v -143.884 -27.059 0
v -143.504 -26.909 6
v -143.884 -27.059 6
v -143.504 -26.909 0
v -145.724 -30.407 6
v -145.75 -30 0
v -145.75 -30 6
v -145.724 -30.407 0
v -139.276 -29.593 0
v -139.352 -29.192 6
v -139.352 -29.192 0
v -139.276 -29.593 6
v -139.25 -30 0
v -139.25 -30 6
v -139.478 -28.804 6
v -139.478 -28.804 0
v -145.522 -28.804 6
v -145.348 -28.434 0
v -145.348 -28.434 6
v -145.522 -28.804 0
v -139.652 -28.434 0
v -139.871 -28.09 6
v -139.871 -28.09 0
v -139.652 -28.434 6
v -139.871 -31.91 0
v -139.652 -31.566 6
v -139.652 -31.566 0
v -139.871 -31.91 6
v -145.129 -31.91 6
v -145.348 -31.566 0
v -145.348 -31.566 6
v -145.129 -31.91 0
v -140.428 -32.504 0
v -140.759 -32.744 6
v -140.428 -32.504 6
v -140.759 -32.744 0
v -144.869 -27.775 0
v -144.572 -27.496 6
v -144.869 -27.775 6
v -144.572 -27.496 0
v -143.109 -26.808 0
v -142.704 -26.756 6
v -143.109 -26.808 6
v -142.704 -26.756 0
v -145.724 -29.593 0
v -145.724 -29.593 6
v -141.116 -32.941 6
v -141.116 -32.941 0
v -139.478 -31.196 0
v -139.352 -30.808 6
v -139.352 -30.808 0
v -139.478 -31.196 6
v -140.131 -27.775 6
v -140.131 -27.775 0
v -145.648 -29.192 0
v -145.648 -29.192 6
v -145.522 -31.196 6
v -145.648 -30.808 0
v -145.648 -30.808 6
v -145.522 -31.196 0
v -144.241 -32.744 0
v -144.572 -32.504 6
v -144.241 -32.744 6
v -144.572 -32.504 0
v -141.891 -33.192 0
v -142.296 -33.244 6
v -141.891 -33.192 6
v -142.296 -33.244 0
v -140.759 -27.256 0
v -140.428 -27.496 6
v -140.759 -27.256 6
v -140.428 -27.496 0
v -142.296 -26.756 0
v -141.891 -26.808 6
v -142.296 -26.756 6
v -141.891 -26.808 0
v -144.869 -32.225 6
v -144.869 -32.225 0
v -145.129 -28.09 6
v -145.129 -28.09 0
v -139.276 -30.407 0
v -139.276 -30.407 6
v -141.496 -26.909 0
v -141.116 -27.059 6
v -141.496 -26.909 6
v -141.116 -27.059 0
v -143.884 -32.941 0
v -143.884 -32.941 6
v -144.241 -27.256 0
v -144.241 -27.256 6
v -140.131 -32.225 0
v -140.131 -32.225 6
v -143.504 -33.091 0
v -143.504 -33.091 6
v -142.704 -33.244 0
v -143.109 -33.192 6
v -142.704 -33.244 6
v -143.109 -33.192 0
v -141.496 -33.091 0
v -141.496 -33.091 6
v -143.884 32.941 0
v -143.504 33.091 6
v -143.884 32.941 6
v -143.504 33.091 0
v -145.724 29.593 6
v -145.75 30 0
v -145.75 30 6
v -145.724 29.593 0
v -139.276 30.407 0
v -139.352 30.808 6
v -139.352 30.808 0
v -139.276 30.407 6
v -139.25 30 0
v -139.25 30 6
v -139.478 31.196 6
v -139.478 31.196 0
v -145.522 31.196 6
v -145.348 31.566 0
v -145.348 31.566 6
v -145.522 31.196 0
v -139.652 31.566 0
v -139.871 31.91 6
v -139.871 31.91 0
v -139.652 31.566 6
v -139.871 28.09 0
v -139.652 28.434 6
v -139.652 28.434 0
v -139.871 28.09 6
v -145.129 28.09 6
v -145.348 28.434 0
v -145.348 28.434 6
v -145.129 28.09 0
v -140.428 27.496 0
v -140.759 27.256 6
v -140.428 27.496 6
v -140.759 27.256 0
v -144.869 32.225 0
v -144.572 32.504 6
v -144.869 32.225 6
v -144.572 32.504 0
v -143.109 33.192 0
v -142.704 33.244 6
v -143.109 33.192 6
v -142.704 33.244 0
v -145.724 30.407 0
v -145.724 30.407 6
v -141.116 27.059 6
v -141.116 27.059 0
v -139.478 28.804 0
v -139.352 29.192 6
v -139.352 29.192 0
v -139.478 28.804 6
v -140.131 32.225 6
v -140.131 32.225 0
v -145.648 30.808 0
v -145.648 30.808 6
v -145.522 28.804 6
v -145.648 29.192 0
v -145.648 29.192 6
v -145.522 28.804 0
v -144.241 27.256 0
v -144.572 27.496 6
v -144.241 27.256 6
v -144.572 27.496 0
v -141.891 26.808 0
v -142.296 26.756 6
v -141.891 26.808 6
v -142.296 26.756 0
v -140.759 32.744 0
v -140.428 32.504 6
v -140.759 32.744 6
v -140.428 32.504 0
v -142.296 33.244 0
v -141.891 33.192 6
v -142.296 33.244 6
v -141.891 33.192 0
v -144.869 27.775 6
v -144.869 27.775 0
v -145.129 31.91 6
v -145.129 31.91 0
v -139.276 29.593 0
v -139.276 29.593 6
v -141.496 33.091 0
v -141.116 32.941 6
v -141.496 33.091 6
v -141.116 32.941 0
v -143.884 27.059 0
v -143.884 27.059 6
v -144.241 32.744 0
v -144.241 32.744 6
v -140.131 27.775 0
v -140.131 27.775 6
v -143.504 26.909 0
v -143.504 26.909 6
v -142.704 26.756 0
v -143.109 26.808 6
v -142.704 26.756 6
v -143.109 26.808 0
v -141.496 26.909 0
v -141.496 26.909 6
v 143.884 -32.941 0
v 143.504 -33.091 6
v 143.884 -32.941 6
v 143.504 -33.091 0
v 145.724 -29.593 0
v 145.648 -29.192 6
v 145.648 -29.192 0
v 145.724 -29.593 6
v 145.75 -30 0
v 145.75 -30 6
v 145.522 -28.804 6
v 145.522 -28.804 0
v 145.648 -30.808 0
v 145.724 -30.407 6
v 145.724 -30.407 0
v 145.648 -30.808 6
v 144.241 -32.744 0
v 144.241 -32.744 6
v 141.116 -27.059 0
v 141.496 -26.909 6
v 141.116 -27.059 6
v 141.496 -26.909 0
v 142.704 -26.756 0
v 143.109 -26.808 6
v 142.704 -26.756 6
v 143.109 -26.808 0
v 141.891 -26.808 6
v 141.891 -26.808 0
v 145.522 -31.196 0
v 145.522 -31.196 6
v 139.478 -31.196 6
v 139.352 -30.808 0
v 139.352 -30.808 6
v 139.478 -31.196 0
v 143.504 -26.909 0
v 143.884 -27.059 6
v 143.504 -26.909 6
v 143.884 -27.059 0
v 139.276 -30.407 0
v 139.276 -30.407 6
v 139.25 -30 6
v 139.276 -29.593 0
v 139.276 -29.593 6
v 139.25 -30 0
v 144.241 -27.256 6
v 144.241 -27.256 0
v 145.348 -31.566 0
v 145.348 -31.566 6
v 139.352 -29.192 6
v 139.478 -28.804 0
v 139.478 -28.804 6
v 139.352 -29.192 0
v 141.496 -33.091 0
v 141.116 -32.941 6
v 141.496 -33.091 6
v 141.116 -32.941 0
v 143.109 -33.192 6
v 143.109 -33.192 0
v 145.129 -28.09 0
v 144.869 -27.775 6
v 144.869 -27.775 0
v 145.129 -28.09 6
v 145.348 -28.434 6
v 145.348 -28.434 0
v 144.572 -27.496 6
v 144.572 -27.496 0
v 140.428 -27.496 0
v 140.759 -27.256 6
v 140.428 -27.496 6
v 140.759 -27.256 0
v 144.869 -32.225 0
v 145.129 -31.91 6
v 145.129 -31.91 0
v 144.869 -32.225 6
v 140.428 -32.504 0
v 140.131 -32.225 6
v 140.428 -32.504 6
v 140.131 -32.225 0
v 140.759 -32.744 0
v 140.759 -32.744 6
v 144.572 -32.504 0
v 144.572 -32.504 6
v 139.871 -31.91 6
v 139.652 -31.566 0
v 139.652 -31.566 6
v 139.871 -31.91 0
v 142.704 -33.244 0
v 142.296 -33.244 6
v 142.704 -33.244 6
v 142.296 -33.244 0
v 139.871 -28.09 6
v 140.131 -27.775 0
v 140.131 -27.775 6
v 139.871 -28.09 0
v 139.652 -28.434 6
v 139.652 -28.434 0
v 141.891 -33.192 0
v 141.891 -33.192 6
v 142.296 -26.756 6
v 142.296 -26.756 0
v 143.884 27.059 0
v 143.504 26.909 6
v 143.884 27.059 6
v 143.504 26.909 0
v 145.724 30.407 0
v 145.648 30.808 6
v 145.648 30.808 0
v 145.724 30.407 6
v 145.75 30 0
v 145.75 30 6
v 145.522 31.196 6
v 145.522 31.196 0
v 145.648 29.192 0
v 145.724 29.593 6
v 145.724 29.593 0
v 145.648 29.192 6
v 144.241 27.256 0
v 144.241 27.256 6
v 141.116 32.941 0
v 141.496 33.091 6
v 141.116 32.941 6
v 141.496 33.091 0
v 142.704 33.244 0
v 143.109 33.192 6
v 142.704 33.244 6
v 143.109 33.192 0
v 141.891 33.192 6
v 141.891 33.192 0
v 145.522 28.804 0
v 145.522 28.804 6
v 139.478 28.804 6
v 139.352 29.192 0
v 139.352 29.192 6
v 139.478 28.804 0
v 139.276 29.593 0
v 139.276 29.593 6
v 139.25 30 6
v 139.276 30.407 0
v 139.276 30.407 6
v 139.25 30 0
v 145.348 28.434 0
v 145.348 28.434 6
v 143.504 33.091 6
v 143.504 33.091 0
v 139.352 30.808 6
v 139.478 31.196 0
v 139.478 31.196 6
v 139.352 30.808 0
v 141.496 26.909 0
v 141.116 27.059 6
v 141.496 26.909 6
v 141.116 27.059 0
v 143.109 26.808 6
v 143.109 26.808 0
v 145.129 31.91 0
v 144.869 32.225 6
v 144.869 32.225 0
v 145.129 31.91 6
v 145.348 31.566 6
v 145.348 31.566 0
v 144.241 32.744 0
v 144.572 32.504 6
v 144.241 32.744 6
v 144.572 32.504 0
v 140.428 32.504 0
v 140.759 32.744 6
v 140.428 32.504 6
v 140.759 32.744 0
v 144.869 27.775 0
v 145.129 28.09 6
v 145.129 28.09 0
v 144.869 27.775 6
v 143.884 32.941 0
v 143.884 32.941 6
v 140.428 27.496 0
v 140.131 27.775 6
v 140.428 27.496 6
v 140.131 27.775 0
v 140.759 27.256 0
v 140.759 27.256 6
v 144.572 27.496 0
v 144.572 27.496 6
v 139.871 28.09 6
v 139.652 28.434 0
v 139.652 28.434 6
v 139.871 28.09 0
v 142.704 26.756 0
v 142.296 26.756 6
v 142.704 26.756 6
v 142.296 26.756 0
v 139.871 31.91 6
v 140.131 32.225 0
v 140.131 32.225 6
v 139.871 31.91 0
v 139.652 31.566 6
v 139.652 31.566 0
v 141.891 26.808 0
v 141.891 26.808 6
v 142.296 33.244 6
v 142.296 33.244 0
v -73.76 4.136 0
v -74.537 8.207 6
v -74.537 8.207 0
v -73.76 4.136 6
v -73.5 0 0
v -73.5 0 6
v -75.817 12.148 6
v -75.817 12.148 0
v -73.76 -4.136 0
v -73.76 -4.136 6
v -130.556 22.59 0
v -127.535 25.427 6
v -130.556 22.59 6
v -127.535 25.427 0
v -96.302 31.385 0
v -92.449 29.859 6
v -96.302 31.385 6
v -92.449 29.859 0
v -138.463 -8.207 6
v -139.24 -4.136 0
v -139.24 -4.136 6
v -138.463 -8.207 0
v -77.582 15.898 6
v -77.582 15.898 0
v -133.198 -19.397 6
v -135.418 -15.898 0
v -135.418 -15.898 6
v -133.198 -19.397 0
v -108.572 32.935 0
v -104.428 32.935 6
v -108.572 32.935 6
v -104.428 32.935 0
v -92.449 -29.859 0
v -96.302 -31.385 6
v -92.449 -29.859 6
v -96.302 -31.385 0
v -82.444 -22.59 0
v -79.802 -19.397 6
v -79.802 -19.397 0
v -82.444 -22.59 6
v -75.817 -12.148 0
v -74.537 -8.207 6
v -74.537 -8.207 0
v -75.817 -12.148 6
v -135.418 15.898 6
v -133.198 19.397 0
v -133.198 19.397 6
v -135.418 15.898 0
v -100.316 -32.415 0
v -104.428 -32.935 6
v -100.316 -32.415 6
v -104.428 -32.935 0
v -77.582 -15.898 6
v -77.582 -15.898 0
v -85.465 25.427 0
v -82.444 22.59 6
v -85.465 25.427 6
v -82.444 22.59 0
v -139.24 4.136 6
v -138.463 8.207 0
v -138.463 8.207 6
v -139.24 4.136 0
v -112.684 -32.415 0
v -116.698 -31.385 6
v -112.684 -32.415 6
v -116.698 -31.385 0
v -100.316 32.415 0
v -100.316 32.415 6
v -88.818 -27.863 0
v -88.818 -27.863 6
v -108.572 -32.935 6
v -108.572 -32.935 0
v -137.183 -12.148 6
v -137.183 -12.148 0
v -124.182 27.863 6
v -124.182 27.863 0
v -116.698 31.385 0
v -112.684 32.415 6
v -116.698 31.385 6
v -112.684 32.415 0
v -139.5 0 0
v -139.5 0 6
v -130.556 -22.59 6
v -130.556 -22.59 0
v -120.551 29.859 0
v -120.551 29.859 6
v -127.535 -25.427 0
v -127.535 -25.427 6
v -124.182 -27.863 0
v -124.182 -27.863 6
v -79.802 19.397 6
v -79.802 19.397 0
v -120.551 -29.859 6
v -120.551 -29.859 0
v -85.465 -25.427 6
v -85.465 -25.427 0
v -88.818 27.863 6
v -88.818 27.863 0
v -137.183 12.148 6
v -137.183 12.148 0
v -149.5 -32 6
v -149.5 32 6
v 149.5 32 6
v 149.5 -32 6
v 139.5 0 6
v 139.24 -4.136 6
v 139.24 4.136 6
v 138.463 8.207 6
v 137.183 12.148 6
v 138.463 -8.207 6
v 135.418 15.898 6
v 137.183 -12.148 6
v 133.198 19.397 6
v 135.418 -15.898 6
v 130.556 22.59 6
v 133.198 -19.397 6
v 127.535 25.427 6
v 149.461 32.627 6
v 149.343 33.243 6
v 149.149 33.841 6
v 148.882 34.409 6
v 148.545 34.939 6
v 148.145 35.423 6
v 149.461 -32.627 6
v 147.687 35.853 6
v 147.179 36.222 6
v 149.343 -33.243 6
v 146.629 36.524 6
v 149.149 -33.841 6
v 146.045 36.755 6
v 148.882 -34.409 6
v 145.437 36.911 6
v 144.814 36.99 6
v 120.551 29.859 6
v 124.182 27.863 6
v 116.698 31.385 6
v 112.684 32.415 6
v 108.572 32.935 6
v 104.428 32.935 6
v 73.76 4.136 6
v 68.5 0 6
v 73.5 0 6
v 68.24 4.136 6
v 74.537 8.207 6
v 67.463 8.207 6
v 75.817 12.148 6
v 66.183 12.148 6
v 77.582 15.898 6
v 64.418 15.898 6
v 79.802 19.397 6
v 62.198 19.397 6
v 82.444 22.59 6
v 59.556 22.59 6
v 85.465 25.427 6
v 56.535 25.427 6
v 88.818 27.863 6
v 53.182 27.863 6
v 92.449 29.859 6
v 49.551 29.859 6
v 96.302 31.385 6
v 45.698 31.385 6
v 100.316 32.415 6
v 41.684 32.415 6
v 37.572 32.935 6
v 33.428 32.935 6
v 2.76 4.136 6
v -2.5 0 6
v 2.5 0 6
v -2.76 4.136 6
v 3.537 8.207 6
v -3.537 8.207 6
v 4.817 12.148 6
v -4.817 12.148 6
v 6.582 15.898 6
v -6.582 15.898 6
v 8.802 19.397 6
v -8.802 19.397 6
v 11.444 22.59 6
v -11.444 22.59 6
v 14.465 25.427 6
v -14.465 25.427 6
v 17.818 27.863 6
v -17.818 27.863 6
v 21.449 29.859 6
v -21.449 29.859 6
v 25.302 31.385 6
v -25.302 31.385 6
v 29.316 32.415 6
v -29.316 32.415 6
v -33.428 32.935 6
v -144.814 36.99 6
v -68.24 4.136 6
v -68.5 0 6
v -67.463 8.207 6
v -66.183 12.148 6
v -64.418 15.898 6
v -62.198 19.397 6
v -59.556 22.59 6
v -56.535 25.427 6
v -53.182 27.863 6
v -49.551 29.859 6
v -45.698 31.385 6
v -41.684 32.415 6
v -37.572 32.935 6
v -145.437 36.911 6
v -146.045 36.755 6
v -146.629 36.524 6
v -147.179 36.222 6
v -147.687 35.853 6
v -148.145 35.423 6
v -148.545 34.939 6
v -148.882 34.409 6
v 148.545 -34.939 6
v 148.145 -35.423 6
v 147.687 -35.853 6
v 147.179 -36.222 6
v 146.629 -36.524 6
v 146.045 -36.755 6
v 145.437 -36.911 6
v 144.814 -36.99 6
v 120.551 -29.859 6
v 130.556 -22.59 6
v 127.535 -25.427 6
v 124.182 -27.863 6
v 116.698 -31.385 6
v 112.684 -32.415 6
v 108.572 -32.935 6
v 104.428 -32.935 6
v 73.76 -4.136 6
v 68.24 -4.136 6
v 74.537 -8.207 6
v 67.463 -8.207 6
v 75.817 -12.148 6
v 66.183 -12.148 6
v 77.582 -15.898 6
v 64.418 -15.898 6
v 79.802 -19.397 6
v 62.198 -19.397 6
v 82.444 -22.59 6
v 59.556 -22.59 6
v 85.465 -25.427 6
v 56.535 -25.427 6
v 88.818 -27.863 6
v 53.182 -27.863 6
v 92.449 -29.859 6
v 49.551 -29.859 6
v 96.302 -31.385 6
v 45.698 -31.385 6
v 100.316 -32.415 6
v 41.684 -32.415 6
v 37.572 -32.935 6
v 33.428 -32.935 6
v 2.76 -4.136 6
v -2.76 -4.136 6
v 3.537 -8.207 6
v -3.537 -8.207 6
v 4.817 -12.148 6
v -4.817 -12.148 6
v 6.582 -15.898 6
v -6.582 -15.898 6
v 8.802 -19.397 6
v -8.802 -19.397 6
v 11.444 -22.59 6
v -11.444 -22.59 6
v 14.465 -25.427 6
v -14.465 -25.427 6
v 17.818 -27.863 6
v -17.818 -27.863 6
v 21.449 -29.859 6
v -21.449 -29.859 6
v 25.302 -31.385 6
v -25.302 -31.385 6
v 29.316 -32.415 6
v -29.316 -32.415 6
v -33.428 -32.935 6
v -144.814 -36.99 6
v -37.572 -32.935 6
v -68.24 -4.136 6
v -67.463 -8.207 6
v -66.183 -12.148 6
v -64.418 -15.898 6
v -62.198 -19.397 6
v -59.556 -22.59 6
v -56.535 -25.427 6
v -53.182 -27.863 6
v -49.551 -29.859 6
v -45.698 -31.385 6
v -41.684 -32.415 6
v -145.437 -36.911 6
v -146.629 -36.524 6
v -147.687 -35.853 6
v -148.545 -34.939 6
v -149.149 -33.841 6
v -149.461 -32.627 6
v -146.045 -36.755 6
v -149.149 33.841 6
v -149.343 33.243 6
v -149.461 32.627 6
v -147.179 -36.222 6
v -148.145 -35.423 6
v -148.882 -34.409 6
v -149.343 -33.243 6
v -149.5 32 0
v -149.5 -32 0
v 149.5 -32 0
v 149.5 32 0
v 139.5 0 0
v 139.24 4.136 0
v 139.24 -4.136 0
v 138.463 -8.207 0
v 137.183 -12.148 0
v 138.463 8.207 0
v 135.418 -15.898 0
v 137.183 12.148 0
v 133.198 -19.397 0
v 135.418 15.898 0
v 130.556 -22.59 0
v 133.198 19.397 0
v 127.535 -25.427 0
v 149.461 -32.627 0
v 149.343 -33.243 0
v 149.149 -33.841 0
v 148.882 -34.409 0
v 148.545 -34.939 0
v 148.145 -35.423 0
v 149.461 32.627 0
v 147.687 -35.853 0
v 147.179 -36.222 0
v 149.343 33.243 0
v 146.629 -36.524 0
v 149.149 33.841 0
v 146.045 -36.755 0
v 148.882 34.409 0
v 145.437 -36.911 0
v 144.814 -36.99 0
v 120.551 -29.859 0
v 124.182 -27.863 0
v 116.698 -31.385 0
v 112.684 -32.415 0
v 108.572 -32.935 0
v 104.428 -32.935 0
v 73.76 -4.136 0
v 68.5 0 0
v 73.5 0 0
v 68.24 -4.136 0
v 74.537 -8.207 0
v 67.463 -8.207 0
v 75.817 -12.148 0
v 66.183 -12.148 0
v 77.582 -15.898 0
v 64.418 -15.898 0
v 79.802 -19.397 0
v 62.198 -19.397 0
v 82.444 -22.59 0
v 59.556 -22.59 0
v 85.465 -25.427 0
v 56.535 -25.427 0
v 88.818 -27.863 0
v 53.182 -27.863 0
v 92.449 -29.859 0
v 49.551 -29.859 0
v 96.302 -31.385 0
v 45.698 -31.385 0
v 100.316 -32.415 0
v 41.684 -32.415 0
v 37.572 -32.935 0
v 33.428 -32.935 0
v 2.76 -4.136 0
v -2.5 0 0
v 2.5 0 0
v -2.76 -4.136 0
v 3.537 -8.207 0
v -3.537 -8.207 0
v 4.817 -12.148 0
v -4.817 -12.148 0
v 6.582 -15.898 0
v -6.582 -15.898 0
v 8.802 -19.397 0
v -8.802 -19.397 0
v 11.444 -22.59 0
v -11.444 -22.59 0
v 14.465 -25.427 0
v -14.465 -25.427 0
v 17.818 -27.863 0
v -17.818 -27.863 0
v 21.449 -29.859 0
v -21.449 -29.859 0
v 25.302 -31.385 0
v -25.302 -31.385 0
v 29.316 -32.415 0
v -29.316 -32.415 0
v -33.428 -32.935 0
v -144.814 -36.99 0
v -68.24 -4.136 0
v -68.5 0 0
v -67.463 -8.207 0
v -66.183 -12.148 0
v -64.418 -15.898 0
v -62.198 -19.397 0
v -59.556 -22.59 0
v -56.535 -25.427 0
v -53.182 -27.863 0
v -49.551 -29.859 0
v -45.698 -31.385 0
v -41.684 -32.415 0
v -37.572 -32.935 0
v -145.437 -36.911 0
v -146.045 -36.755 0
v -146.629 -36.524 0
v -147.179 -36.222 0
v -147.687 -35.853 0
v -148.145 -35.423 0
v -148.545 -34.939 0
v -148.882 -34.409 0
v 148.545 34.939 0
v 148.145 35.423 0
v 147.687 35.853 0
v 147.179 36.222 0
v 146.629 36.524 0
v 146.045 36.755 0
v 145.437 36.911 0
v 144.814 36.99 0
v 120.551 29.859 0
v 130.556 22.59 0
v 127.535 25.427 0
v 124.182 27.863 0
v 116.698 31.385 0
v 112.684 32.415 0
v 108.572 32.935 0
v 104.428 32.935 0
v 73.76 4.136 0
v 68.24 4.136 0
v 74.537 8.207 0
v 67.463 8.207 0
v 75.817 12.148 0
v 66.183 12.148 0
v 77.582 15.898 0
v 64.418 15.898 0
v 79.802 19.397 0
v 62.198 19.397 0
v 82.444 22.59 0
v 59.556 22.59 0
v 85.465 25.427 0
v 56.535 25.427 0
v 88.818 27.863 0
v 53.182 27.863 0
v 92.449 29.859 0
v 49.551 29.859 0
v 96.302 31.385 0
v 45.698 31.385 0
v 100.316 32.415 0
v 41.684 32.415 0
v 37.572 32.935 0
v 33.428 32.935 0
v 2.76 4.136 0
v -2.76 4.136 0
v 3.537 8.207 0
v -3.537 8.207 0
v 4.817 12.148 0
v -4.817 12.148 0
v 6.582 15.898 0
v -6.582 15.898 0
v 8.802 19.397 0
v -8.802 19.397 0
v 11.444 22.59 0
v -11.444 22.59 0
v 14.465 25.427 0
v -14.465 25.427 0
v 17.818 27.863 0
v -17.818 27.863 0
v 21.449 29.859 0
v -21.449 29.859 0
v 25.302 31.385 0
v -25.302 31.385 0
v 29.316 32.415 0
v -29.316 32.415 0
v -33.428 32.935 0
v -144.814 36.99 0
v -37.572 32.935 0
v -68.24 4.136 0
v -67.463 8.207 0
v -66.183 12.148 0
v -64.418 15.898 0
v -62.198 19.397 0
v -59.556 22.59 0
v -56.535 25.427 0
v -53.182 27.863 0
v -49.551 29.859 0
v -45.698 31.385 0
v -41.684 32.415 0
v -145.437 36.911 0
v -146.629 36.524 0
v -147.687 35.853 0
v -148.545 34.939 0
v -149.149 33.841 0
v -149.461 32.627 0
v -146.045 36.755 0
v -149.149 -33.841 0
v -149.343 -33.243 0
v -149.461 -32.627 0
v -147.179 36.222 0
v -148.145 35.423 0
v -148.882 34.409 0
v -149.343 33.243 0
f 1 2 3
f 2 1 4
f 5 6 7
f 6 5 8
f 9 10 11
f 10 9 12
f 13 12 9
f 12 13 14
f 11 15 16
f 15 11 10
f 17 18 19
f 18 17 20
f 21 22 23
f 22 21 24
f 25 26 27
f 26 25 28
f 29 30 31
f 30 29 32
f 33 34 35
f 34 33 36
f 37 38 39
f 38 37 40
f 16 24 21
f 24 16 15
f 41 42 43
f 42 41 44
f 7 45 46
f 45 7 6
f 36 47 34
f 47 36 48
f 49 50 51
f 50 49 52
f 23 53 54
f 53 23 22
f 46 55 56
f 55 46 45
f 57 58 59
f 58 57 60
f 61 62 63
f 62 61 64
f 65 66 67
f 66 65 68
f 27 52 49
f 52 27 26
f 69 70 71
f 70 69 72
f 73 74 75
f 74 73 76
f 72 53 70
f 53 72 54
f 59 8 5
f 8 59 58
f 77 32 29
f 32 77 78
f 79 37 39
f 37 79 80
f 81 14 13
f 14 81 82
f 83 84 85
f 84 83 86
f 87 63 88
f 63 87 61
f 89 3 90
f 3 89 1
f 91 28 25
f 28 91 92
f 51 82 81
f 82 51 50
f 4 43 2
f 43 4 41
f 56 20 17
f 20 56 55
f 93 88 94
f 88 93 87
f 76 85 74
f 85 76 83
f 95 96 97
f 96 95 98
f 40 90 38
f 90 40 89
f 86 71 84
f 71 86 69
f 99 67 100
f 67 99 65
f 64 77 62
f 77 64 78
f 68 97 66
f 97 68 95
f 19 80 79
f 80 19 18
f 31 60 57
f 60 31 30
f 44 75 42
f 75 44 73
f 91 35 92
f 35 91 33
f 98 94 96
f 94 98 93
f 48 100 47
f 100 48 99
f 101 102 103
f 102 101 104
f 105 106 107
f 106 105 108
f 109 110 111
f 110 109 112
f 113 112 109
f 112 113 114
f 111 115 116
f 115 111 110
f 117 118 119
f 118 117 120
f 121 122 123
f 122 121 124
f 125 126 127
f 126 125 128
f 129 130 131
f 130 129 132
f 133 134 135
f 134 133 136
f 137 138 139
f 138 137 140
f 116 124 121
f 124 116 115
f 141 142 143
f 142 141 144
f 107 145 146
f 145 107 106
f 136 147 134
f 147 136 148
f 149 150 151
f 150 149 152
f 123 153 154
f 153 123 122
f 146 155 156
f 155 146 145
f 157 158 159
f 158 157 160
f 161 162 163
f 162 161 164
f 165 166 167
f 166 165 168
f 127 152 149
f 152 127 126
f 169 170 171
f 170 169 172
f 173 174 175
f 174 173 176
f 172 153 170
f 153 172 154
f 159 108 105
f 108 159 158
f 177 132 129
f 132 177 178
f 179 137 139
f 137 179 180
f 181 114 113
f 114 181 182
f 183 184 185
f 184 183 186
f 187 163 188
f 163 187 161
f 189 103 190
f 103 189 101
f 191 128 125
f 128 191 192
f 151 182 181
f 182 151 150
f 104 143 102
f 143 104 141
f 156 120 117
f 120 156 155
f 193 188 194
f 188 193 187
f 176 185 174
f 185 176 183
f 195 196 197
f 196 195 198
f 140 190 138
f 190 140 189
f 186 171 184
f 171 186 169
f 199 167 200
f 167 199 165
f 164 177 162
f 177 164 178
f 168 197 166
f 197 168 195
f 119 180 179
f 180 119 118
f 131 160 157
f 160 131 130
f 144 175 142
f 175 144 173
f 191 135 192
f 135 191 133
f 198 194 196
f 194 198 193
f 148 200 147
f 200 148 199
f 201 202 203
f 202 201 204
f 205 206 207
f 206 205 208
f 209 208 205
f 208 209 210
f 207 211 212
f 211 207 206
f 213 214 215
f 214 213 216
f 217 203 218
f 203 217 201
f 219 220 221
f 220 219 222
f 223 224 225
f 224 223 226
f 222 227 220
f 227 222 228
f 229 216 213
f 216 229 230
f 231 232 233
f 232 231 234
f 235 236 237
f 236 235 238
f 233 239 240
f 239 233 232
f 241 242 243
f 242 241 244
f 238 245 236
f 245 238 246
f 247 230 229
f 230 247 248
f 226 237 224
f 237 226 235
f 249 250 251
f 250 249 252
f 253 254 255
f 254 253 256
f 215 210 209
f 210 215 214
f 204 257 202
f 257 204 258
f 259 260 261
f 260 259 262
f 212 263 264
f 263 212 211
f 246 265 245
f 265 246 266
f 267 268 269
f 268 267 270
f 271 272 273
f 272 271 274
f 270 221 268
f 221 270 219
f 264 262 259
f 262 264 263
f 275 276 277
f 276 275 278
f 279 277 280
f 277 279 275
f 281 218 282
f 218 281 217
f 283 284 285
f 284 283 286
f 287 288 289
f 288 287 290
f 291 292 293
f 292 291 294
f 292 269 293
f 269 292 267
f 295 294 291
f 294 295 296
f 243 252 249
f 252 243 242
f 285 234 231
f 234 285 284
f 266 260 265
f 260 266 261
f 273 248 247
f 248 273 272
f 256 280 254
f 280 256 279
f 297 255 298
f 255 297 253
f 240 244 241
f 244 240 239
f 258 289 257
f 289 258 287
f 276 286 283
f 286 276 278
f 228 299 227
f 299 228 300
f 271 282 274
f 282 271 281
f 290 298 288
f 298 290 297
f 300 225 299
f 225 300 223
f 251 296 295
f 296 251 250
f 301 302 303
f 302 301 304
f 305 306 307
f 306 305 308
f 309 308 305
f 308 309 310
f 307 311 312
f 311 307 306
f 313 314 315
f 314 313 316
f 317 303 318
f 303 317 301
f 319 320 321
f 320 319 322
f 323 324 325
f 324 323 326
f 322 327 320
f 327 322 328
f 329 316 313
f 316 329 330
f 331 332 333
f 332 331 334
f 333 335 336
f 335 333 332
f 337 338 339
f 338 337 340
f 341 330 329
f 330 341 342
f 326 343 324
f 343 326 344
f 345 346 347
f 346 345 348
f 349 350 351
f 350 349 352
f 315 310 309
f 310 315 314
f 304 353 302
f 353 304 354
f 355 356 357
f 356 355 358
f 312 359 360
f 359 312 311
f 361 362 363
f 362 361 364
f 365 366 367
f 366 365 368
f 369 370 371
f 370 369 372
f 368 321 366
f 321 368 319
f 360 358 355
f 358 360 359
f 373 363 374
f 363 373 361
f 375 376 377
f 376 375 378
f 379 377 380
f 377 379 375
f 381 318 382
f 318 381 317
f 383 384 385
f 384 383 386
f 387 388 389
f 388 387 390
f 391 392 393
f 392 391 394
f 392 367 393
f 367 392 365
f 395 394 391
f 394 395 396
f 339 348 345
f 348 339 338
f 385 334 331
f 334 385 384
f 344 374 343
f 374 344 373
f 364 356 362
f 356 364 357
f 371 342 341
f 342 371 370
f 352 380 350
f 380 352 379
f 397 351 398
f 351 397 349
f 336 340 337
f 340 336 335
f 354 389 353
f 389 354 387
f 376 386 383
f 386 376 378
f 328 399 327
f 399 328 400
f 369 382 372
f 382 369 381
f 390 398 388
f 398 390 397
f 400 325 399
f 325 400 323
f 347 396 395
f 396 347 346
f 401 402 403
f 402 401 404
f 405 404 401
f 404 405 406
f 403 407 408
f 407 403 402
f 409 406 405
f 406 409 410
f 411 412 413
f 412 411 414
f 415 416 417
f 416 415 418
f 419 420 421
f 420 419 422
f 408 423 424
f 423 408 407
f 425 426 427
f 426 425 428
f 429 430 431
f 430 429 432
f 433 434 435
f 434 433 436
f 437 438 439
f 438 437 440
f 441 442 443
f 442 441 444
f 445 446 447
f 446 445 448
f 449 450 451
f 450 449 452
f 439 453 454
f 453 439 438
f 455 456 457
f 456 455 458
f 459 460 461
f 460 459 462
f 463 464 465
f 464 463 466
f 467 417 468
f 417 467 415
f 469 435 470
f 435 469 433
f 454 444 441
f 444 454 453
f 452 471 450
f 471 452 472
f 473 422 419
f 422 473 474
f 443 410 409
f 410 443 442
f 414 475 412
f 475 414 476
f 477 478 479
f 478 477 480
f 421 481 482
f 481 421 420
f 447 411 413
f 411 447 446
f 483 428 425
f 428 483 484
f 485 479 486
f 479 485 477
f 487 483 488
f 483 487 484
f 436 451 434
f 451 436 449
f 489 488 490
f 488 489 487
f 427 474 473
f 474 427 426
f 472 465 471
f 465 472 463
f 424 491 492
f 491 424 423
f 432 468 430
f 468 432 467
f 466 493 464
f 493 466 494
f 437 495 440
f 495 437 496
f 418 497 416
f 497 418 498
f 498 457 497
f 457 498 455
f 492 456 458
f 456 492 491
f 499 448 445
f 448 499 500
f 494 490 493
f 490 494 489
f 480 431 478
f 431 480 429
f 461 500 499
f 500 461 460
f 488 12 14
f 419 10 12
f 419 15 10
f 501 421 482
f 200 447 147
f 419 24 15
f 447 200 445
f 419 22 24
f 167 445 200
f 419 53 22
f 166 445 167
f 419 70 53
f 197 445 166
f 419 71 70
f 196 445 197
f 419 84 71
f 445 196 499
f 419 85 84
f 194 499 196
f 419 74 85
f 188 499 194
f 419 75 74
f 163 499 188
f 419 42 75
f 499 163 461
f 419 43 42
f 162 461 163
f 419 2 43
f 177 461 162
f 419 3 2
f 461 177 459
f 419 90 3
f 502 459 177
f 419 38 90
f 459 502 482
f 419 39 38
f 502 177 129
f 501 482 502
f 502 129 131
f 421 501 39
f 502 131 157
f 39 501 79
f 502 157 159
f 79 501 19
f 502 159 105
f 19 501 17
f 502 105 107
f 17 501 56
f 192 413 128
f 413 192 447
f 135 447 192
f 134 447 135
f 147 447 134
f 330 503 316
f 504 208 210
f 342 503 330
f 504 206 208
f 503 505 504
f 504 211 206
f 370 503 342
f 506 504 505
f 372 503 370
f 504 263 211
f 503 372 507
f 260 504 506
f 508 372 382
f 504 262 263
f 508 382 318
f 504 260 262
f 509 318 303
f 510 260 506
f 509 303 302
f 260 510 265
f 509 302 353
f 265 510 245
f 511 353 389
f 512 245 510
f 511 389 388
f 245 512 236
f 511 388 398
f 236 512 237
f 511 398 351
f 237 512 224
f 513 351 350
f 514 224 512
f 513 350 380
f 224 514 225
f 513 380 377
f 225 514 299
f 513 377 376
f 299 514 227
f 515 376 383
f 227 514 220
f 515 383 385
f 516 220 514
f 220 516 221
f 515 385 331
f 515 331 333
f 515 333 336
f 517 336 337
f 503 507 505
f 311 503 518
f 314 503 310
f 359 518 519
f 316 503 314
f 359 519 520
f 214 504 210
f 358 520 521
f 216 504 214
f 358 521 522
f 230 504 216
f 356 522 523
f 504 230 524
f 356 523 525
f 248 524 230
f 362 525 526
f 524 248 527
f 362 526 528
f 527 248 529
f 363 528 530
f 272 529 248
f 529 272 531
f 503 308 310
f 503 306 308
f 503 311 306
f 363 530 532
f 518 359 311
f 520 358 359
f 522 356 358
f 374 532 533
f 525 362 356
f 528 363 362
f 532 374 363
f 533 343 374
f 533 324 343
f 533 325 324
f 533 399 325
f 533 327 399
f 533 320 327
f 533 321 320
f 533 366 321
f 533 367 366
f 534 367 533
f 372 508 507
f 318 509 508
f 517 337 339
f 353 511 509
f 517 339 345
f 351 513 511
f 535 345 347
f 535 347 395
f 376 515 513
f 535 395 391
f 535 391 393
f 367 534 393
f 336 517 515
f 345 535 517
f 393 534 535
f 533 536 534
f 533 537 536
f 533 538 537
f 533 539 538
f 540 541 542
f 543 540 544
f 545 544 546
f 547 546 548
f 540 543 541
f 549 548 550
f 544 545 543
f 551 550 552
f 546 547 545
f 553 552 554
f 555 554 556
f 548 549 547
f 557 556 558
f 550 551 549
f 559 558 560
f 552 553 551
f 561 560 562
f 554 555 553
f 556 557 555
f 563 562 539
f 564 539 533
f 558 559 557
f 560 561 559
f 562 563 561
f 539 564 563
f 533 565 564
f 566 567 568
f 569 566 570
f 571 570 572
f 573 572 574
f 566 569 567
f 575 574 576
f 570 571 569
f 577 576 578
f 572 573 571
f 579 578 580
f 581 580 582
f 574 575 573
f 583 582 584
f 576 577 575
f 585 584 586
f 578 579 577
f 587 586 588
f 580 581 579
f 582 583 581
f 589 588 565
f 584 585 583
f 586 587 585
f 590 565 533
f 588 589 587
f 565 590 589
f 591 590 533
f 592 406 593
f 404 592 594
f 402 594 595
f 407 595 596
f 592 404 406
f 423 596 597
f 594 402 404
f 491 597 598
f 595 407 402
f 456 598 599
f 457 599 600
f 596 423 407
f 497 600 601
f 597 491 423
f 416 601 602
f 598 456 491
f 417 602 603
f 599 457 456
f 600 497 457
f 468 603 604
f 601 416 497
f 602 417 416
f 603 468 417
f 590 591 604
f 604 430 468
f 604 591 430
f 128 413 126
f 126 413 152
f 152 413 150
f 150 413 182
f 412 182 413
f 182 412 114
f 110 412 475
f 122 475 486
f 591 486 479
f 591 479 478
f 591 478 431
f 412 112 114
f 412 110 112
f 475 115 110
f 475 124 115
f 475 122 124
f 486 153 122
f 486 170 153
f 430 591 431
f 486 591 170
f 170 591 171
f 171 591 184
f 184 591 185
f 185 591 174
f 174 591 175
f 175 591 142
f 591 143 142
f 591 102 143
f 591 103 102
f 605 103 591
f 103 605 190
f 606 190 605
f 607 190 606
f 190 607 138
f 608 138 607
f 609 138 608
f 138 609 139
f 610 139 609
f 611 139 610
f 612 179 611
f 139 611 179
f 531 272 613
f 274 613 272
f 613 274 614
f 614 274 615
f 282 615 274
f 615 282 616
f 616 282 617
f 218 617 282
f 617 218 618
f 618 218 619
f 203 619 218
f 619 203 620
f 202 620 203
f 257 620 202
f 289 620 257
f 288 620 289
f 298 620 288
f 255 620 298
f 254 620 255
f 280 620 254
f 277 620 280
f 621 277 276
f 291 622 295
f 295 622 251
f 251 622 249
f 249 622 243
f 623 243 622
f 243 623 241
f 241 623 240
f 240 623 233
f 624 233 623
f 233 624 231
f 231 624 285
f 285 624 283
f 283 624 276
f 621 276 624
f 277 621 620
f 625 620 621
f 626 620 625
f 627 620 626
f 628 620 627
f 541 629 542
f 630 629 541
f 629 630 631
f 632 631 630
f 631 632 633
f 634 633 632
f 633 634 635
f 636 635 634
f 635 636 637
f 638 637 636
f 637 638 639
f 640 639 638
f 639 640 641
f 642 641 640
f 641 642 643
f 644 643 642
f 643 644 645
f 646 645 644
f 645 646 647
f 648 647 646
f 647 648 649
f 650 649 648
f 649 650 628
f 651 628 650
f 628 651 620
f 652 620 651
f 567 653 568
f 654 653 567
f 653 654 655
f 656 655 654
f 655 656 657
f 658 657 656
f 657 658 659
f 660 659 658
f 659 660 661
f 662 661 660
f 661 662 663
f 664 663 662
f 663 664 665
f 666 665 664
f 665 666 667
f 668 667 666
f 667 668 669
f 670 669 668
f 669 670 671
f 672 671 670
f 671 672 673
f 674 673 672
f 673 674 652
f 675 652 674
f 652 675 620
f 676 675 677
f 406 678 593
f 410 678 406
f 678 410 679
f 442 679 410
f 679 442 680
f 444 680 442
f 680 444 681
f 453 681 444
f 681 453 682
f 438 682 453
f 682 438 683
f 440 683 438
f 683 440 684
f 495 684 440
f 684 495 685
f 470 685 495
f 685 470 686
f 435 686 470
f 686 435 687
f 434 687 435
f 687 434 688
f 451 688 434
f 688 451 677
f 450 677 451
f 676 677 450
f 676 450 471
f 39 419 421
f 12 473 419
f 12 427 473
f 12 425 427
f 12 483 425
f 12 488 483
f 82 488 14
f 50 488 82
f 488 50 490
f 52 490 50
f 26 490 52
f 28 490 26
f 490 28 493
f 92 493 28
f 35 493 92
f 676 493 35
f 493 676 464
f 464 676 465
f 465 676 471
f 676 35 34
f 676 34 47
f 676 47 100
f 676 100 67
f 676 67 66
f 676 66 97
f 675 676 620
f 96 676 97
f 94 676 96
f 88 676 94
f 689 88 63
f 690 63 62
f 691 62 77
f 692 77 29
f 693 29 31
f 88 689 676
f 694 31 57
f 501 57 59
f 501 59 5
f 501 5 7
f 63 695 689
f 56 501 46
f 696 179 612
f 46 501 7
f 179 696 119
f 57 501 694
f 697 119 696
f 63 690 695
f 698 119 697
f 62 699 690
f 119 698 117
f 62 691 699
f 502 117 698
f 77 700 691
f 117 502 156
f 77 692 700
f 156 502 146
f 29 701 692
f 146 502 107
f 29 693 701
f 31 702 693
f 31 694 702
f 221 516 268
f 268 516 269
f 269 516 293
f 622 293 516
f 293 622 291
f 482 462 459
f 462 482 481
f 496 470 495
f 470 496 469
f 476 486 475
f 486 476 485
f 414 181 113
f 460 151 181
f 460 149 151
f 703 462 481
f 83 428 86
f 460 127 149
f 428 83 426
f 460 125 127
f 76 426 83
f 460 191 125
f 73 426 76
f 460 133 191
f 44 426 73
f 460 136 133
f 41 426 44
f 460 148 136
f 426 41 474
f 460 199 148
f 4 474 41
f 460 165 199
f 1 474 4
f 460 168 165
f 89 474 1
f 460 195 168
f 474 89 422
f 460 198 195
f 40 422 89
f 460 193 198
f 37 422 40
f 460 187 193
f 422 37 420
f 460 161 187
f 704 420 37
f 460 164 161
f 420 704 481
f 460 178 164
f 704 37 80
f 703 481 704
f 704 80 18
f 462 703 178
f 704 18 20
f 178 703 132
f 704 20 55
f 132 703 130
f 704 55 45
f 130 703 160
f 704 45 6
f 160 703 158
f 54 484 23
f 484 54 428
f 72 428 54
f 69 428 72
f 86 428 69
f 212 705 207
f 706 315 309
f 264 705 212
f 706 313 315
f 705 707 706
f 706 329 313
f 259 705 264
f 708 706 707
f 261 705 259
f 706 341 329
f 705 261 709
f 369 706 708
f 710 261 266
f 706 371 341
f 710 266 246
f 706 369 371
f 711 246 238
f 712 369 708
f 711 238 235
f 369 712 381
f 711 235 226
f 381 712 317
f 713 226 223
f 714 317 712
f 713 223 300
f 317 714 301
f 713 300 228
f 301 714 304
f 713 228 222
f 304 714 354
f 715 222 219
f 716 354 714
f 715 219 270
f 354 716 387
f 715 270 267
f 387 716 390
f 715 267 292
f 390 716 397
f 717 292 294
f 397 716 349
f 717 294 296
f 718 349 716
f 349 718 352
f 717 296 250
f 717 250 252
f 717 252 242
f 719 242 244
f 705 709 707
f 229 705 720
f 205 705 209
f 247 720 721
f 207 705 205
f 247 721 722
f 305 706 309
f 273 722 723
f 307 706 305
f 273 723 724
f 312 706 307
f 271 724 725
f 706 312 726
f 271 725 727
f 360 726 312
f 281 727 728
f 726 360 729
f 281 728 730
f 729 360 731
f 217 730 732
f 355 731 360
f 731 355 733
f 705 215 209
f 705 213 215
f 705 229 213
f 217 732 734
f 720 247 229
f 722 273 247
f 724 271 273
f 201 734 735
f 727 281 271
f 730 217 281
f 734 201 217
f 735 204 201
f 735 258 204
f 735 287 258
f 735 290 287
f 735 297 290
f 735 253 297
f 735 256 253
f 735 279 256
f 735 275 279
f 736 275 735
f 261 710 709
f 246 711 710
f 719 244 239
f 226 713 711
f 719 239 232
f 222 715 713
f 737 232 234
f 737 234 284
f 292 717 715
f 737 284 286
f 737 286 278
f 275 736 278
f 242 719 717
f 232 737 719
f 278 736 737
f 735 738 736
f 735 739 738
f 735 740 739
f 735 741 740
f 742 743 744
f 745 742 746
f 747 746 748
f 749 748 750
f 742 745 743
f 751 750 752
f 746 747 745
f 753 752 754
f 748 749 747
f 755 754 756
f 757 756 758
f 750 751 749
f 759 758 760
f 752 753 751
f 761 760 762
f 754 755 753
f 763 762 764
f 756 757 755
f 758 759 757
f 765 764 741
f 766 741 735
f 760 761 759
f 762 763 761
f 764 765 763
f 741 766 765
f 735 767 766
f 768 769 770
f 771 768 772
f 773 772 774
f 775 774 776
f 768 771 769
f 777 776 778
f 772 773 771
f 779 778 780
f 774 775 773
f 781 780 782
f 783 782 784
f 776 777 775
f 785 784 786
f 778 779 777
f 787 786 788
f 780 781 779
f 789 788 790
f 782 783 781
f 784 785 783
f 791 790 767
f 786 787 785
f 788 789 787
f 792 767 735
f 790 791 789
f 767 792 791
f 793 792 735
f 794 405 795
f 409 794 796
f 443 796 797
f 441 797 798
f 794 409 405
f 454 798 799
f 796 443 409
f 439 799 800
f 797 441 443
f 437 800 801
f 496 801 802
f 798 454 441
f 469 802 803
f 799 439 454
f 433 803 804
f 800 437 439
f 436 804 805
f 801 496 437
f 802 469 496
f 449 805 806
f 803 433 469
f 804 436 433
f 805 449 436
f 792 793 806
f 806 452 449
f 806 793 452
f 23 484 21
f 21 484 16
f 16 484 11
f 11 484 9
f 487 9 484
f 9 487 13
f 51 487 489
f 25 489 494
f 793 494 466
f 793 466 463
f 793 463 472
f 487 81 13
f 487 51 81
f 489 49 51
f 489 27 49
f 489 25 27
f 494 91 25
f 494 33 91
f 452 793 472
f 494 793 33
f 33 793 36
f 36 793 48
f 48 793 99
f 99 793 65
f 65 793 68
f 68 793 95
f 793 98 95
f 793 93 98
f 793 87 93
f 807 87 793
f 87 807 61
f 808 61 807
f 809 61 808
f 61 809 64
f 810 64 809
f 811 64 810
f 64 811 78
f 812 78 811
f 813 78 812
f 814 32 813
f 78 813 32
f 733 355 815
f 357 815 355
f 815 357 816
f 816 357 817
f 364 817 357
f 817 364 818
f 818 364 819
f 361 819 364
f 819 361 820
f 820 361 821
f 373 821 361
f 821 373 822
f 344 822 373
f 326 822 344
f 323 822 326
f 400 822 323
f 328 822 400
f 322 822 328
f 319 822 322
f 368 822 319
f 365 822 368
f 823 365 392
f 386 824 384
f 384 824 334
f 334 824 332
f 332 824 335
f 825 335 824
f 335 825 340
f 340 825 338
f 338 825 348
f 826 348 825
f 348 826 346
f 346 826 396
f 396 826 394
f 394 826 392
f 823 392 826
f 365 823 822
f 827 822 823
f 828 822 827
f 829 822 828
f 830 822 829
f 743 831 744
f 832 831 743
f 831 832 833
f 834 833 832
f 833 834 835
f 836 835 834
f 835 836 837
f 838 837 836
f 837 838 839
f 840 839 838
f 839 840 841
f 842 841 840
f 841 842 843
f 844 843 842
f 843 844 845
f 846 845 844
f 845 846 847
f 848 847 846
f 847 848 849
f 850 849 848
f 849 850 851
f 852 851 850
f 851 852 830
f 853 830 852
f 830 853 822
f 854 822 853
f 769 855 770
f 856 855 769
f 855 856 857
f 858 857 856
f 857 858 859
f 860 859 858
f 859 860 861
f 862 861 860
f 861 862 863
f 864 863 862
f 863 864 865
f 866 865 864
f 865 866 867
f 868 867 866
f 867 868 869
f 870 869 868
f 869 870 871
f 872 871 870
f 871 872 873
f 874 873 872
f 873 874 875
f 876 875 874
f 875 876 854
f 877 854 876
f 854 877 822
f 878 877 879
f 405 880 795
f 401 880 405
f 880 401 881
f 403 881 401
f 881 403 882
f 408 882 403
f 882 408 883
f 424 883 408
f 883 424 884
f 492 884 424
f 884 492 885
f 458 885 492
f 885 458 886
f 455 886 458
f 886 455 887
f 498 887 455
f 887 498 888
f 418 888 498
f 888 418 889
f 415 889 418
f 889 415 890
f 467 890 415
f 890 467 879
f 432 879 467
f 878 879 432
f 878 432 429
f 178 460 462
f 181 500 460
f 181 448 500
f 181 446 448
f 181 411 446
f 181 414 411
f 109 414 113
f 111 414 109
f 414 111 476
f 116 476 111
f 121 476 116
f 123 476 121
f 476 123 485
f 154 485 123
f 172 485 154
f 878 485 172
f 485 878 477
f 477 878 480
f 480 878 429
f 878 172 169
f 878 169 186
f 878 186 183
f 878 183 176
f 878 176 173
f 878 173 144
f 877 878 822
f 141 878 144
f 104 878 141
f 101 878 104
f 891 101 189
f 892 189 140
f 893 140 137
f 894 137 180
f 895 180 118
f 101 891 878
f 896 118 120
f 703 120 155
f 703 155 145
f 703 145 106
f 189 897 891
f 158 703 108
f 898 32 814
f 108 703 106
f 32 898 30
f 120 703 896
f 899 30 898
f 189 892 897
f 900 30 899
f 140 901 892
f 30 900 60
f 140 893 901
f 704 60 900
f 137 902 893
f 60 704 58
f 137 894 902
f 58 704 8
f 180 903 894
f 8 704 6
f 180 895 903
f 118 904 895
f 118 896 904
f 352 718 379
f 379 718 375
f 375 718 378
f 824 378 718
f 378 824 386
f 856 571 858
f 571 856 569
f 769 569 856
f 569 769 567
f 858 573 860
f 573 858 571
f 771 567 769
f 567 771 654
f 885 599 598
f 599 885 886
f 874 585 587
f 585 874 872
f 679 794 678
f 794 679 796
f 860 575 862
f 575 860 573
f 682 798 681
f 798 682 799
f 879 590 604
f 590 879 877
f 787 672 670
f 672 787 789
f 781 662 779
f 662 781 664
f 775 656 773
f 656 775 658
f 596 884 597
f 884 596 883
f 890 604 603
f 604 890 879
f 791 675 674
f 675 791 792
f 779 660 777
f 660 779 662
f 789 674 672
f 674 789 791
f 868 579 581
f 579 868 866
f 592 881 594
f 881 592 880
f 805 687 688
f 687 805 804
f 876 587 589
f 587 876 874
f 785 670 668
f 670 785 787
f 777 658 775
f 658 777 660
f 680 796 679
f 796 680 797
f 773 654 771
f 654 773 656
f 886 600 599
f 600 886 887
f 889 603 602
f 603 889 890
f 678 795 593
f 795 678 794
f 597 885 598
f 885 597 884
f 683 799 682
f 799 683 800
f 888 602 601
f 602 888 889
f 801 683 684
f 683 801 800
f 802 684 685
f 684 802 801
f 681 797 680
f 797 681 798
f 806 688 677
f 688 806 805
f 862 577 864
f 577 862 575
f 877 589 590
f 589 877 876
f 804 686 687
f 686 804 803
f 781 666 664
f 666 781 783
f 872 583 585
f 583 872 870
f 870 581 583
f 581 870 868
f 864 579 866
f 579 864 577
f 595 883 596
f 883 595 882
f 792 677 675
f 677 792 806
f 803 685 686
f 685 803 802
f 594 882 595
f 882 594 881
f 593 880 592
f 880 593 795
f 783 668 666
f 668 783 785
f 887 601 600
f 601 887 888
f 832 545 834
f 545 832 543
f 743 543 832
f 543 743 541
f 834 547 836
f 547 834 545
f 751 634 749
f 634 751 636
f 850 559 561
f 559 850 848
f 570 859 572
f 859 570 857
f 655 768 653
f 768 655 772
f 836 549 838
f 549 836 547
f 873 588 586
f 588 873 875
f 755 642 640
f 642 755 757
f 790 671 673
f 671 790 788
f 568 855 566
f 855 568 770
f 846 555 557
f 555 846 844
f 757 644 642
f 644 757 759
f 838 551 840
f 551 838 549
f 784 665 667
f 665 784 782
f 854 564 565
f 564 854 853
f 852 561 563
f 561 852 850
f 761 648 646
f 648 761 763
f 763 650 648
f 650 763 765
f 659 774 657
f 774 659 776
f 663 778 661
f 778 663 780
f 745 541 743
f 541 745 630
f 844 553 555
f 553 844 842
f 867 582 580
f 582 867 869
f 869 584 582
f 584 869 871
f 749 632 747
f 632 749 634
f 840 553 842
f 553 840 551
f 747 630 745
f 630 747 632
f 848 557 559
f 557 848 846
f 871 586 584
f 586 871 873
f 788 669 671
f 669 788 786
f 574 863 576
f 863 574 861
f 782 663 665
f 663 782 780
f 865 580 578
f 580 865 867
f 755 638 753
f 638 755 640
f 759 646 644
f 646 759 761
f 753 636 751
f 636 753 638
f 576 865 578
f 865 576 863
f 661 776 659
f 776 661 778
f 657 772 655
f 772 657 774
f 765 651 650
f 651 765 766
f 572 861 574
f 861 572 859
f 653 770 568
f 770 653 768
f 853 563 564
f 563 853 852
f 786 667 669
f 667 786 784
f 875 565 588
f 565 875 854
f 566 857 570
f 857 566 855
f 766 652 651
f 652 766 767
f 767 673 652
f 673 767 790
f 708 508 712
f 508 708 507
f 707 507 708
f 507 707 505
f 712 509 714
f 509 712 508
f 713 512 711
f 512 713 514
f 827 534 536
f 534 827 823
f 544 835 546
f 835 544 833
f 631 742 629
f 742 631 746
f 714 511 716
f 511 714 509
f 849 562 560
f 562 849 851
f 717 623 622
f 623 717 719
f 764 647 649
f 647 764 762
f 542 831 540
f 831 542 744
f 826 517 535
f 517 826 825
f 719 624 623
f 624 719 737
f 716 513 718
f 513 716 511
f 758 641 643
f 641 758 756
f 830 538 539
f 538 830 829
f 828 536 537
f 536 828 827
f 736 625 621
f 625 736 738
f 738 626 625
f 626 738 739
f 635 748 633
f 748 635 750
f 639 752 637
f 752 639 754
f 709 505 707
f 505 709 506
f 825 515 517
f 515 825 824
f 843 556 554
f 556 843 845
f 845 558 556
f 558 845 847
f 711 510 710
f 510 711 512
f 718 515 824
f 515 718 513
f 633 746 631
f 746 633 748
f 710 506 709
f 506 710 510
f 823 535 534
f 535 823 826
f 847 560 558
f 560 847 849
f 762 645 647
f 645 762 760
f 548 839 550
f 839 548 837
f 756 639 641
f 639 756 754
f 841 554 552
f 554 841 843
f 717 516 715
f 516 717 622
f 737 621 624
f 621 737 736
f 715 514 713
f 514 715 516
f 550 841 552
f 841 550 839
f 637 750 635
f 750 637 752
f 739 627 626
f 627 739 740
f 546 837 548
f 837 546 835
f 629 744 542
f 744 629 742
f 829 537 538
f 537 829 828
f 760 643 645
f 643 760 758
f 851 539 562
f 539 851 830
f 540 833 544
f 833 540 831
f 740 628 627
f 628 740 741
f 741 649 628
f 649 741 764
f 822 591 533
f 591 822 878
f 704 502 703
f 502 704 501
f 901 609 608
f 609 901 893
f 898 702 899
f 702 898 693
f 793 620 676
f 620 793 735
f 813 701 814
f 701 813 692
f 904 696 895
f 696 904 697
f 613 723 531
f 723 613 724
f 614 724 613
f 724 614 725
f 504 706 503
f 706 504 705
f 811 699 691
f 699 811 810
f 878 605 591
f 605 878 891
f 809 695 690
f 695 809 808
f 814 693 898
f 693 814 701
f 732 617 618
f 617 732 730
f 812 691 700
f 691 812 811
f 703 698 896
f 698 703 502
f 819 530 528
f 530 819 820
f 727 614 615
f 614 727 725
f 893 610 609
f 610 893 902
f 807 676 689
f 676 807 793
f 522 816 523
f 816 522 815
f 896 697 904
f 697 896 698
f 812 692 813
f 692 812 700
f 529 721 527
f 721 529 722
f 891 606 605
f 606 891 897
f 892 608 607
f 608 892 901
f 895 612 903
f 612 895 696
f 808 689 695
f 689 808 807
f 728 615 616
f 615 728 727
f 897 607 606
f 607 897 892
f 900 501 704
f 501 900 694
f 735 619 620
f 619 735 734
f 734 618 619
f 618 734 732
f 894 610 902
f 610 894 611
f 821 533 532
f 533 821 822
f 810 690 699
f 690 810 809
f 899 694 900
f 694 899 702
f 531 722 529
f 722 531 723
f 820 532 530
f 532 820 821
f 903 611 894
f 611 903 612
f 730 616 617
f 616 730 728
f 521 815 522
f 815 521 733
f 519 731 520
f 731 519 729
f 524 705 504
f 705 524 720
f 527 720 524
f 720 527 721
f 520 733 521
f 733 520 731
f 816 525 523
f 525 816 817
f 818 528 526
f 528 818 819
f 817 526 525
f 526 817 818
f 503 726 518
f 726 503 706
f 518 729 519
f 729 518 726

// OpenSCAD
$fn = 50;


difference() {
	union() {
		hull() {
			translate(v = [-144.5000000000, 32.0000000000, 0]) {
				cylinder(h = 6, r = 5);
			}
			translate(v = [144.5000000000, 32.0000000000, 0]) {
				cylinder(h = 6, r = 5);
			}
			translate(v = [-144.5000000000, -32.0000000000, 0]) {
				cylinder(h = 6, r = 5);
			}
			translate(v = [144.5000000000, -32.0000000000, 0]) {
				cylinder(h = 6, r = 5);
			}
		}
	}
	union() {
		#translate(v = [-142.5000000000, -30.0000000000, -100.0000000000]) {
			cylinder(h = 200, r = 3.2500000000);
		}
		#translate(v = [-142.5000000000, 30.0000000000, -100.0000000000]) {
			cylinder(h = 200, r = 3.2500000000);
		}
		#translate(v = [142.5000000000, -30.0000000000, -100.0000000000]) {
			cylinder(h = 200, r = 3.2500000000);
		}
		#translate(v = [142.5000000000, 30.0000000000, -100.0000000000]) {
			cylinder(h = 200, r = 3.2500000000);
		}
		#translate(v = [-106.5000000000, 0, 0]) {
			cylinder(h = 6, r = 33.0000000000);
		}
		#translate(v = [-35.5000000000, 0, 0]) {
			cylinder(h = 6, r = 33.0000000000);
		}
		#translate(v = [35.5000000000, 0, 0]) {
			cylinder(h = 6, r = 33.0000000000);
		}
		#translate(v = [106.5000000000, 0, 0]) {
			cylinder(h = 6, r = 33.0000000000);
		}
	}
}
